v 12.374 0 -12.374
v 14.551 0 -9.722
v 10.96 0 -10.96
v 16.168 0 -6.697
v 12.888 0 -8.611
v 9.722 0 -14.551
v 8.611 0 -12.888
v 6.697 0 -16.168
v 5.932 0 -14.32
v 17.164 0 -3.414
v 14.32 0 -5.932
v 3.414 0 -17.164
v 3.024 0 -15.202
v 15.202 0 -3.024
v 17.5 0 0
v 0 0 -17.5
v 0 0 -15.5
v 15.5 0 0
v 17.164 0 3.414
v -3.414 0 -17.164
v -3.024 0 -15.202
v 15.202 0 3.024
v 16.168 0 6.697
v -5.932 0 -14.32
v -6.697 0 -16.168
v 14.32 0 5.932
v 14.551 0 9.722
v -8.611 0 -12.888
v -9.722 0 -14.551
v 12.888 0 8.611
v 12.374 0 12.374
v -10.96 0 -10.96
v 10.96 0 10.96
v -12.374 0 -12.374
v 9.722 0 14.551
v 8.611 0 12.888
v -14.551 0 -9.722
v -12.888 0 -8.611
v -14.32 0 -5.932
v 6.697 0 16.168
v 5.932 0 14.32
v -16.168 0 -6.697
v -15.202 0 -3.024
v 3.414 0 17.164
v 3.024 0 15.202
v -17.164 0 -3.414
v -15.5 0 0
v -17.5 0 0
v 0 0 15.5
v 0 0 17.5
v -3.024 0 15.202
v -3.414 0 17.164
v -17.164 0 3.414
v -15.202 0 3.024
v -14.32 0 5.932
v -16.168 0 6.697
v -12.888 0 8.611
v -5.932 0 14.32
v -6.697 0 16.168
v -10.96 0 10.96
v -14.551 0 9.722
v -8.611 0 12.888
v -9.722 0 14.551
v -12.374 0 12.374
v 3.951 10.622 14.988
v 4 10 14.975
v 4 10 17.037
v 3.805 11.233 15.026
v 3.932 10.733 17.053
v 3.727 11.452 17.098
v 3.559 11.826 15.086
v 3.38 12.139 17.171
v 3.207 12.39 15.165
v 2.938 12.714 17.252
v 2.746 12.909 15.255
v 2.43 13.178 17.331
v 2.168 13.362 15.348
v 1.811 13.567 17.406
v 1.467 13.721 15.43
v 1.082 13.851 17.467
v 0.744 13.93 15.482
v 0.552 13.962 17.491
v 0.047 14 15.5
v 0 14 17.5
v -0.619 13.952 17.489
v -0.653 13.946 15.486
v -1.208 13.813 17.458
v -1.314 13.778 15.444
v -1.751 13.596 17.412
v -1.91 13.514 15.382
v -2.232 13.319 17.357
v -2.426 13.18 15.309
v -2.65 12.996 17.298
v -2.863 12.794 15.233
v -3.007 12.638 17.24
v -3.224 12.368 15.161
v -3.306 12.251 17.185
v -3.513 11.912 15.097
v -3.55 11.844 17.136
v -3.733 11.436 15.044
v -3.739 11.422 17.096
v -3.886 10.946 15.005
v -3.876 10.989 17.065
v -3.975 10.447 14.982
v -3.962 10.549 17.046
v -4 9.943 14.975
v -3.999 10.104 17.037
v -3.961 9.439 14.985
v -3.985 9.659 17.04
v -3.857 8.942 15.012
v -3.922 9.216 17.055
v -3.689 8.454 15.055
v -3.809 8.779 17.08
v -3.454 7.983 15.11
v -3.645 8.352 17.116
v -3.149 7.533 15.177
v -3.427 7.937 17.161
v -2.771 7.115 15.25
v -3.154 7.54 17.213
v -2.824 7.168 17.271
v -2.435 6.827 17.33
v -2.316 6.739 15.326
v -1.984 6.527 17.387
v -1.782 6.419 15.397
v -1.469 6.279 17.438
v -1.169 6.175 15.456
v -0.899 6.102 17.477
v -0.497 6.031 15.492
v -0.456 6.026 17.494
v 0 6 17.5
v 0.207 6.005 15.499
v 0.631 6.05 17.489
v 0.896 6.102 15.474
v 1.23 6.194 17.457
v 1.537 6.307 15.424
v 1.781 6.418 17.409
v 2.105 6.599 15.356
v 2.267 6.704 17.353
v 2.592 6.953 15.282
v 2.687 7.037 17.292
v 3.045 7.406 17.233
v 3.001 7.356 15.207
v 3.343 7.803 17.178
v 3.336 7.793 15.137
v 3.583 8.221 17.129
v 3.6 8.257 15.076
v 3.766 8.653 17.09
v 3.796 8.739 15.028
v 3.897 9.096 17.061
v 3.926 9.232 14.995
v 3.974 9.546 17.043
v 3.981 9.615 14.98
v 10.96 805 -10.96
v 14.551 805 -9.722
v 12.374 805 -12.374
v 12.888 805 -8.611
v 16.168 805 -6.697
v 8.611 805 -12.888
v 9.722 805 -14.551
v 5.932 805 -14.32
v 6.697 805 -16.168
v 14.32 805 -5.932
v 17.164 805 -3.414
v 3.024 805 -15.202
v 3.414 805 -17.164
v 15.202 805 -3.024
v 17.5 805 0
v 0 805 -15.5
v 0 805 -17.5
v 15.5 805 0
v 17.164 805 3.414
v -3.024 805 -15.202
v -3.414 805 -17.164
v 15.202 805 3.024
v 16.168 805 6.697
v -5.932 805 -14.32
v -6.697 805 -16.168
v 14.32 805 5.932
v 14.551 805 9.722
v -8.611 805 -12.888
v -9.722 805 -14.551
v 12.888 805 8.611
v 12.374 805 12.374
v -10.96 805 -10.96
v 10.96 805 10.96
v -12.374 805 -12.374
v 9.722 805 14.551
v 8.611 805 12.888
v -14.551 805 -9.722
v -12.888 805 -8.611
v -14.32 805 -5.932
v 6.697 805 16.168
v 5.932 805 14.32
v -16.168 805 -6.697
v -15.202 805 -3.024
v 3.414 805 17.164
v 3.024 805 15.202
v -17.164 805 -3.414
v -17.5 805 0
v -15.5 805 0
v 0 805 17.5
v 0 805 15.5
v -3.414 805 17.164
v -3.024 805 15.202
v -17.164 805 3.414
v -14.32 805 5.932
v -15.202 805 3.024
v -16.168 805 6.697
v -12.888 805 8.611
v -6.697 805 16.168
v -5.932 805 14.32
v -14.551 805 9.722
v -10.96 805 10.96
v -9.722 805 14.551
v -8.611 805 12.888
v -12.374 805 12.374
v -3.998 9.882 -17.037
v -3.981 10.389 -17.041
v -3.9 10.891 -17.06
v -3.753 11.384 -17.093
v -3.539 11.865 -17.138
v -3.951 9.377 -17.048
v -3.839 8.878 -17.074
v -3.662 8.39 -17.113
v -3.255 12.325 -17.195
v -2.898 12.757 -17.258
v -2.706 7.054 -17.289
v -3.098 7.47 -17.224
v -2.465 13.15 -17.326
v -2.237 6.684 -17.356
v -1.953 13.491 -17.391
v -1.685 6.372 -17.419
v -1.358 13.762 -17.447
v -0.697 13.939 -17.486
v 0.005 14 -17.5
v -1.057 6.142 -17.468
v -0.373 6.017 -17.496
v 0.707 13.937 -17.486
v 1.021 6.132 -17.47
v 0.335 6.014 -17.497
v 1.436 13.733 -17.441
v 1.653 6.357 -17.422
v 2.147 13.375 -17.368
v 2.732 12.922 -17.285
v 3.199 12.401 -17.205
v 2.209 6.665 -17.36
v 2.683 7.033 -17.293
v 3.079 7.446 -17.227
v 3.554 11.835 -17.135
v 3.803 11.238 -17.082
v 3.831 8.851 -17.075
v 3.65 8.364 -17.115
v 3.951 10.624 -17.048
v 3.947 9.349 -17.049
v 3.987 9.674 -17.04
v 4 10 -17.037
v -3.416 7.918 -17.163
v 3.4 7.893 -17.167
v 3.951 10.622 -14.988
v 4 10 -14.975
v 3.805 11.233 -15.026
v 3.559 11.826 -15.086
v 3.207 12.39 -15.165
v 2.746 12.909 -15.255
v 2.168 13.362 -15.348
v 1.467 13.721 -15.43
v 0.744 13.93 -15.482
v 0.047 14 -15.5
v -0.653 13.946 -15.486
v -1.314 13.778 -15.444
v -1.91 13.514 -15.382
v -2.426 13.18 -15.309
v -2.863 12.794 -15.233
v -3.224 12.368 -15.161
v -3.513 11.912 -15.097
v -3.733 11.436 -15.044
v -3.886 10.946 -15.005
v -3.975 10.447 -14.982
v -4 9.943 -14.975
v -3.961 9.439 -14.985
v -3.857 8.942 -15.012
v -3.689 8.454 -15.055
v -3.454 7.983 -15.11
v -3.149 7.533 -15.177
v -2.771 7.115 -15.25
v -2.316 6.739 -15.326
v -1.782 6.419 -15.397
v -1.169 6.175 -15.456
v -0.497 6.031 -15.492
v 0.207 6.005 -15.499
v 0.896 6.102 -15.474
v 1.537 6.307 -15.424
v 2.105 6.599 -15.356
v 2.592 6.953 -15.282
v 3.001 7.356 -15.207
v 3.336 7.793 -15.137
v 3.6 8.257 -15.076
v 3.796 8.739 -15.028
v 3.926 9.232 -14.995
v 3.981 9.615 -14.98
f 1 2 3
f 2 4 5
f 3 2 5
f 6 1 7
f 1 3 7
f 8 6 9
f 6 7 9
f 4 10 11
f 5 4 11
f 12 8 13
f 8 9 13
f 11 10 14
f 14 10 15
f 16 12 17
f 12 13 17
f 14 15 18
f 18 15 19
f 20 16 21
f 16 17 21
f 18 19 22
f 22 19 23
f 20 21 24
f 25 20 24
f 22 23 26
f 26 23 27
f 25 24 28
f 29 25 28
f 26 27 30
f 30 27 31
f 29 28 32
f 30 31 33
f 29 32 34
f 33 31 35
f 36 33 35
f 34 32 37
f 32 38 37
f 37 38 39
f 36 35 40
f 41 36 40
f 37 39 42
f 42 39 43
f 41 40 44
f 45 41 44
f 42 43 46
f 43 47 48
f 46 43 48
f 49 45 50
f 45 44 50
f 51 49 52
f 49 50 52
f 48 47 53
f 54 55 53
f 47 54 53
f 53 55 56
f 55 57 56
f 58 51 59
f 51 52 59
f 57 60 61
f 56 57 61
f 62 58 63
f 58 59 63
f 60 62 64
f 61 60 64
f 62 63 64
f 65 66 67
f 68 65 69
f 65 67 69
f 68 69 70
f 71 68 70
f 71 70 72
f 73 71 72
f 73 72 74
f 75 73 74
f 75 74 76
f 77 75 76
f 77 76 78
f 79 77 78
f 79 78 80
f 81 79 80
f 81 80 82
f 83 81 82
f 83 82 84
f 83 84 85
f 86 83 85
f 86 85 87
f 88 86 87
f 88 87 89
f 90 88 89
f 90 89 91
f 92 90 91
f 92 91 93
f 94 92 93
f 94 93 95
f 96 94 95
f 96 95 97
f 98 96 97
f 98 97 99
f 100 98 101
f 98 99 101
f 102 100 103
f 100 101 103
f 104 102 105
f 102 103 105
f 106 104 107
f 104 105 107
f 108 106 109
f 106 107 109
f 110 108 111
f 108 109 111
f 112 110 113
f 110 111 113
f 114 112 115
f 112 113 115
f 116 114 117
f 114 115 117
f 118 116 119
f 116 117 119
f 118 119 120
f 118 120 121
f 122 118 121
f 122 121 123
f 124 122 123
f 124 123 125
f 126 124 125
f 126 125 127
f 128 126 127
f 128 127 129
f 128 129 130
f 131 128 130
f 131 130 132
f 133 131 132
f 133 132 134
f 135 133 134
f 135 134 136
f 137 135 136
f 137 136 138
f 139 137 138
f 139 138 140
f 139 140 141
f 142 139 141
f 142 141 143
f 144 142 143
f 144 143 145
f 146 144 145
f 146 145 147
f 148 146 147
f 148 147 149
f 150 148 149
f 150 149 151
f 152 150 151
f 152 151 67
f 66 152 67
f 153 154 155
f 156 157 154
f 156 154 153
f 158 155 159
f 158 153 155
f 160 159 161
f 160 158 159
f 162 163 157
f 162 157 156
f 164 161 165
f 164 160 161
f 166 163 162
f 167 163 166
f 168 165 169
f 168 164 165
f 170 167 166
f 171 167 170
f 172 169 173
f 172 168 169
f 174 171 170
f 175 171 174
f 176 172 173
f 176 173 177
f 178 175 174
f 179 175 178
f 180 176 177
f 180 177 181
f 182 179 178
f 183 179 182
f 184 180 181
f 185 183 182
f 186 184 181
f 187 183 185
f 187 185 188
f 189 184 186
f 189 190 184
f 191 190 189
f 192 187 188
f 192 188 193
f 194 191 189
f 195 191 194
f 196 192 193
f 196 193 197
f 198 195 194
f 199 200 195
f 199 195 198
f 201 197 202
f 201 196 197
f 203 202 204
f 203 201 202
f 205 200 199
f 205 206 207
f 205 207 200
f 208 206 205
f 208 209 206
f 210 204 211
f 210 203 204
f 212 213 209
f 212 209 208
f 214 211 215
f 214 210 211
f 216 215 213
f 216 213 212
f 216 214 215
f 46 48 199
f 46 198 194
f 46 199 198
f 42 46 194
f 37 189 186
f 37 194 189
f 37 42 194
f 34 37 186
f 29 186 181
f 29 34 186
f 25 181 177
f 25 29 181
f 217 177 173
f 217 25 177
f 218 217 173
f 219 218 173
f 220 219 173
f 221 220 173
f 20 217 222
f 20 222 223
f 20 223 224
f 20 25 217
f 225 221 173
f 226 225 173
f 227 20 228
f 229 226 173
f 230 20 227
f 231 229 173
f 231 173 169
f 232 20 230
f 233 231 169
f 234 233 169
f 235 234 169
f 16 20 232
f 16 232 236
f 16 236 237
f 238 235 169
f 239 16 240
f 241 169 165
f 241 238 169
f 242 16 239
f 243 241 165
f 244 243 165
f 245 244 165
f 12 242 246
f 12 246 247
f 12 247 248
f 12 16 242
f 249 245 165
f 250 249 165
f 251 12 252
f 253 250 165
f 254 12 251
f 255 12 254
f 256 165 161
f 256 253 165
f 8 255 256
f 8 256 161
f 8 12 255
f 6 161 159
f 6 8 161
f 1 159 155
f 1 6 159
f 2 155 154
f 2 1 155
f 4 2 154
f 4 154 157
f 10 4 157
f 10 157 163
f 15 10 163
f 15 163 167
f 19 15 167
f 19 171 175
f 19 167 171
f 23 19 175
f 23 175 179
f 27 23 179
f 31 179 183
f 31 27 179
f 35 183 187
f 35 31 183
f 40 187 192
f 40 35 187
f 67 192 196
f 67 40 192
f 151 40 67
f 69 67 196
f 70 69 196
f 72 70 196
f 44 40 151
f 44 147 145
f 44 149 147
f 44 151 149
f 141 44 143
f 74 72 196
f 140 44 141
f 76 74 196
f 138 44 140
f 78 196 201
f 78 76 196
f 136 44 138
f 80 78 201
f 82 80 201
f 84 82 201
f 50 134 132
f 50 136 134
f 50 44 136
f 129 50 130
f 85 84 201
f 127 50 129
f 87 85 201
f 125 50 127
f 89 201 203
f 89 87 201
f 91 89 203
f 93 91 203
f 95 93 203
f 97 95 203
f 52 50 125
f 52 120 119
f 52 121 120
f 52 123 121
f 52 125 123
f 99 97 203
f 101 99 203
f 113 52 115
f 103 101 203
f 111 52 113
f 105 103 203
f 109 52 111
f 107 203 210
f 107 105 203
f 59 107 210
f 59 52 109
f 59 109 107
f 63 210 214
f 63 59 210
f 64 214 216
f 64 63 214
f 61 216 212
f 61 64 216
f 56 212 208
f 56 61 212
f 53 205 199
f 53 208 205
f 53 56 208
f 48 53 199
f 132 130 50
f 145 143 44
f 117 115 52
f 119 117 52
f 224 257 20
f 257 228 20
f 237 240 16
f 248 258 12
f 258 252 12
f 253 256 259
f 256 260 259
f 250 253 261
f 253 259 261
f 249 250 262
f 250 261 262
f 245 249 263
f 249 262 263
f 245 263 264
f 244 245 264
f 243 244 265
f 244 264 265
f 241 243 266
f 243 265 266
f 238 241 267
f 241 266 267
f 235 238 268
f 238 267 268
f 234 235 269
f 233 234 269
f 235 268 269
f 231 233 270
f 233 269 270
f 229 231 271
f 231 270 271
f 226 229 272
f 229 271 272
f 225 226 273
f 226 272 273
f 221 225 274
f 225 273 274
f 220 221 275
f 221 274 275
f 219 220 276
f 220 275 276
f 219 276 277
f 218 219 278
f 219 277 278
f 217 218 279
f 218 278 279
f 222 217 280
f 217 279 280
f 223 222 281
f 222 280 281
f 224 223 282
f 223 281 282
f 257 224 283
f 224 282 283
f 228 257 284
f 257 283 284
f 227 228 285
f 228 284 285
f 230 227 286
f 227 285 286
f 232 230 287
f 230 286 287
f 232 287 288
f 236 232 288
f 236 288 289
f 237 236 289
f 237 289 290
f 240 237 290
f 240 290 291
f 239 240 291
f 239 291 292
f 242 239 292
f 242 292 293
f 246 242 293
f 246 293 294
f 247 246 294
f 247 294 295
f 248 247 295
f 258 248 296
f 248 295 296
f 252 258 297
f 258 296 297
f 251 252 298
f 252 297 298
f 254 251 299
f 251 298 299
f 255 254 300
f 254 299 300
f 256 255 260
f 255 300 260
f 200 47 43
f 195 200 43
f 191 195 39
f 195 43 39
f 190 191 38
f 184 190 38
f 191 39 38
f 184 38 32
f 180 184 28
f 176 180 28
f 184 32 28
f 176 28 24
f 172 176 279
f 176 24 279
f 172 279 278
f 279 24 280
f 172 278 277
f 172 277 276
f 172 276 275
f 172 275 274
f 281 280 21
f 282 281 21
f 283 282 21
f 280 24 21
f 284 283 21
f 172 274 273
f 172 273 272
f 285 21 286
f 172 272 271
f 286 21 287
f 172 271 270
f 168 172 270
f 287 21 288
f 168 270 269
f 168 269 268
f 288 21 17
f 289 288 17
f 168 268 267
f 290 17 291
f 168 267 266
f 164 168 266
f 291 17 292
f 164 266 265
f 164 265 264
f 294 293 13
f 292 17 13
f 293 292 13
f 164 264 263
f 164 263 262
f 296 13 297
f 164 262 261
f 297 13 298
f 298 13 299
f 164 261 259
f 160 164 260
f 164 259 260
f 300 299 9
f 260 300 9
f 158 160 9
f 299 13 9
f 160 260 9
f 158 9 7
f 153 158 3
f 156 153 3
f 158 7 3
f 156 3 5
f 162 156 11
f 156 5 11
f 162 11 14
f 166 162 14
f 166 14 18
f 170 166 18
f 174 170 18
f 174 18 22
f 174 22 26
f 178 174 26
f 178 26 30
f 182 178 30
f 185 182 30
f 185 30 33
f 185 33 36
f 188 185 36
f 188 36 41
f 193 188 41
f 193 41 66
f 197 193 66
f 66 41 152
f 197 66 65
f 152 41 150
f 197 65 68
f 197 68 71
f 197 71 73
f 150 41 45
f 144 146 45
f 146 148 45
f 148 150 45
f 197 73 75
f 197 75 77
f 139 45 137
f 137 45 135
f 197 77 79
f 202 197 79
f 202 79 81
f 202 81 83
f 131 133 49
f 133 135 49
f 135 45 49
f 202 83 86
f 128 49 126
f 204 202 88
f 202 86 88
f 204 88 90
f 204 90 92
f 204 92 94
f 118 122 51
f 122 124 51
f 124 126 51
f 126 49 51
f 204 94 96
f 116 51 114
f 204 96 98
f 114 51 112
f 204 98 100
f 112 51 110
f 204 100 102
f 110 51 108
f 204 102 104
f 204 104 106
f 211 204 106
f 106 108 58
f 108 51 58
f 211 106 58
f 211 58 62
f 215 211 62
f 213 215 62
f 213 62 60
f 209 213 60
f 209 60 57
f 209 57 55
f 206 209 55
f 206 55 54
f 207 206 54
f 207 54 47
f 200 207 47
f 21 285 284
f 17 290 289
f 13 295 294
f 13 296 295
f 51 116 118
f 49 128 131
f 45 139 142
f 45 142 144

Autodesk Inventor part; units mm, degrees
ref_plane "YZ Plane" through (0, 0, 0) normal (1, 0, 0) x (0, 1, 0)
ref_plane "XZ Plane" through (0, 0, 0) normal (0, 1, 0) x (-1, 0, 0)
sketch "Boceto1" plane through (0, 0, 0) normal (0, 1, 0) x (-1, 0, 0)
  circle A0 centre (0, 0) radius 17.5
  dimension "d0" = 35
extrude "Extrusión1" add sketch "Boceto1" along normal blind 805
shell "Vaciado1" thickness 2 removed faces 2 at (-4.3663, 0, -1.0762) at (-4.3663, 805, -1.0762)
ref_plane "Plano de trabajo1" through (0, 0, 17.5) normal (0, 0, 1) x (1, 0, 0)
sketch "Boceto2" plane through (0, 0, 17.5) normal (0, 0, 1) x (1, 0, 0)
  line L0 (0, 81.1949) -> (0, -92.1127) construction
  line L1 (-146.6766, 0) -> (158.2781, 0) construction
  circle A0 centre (0, 10) radius 4
  point P0 (0, 0)
  dimension "d5" = 8
  dimension "d6" = 10
extrude "Extrusión2" cut sketch "Boceto2" against normal blind 50
